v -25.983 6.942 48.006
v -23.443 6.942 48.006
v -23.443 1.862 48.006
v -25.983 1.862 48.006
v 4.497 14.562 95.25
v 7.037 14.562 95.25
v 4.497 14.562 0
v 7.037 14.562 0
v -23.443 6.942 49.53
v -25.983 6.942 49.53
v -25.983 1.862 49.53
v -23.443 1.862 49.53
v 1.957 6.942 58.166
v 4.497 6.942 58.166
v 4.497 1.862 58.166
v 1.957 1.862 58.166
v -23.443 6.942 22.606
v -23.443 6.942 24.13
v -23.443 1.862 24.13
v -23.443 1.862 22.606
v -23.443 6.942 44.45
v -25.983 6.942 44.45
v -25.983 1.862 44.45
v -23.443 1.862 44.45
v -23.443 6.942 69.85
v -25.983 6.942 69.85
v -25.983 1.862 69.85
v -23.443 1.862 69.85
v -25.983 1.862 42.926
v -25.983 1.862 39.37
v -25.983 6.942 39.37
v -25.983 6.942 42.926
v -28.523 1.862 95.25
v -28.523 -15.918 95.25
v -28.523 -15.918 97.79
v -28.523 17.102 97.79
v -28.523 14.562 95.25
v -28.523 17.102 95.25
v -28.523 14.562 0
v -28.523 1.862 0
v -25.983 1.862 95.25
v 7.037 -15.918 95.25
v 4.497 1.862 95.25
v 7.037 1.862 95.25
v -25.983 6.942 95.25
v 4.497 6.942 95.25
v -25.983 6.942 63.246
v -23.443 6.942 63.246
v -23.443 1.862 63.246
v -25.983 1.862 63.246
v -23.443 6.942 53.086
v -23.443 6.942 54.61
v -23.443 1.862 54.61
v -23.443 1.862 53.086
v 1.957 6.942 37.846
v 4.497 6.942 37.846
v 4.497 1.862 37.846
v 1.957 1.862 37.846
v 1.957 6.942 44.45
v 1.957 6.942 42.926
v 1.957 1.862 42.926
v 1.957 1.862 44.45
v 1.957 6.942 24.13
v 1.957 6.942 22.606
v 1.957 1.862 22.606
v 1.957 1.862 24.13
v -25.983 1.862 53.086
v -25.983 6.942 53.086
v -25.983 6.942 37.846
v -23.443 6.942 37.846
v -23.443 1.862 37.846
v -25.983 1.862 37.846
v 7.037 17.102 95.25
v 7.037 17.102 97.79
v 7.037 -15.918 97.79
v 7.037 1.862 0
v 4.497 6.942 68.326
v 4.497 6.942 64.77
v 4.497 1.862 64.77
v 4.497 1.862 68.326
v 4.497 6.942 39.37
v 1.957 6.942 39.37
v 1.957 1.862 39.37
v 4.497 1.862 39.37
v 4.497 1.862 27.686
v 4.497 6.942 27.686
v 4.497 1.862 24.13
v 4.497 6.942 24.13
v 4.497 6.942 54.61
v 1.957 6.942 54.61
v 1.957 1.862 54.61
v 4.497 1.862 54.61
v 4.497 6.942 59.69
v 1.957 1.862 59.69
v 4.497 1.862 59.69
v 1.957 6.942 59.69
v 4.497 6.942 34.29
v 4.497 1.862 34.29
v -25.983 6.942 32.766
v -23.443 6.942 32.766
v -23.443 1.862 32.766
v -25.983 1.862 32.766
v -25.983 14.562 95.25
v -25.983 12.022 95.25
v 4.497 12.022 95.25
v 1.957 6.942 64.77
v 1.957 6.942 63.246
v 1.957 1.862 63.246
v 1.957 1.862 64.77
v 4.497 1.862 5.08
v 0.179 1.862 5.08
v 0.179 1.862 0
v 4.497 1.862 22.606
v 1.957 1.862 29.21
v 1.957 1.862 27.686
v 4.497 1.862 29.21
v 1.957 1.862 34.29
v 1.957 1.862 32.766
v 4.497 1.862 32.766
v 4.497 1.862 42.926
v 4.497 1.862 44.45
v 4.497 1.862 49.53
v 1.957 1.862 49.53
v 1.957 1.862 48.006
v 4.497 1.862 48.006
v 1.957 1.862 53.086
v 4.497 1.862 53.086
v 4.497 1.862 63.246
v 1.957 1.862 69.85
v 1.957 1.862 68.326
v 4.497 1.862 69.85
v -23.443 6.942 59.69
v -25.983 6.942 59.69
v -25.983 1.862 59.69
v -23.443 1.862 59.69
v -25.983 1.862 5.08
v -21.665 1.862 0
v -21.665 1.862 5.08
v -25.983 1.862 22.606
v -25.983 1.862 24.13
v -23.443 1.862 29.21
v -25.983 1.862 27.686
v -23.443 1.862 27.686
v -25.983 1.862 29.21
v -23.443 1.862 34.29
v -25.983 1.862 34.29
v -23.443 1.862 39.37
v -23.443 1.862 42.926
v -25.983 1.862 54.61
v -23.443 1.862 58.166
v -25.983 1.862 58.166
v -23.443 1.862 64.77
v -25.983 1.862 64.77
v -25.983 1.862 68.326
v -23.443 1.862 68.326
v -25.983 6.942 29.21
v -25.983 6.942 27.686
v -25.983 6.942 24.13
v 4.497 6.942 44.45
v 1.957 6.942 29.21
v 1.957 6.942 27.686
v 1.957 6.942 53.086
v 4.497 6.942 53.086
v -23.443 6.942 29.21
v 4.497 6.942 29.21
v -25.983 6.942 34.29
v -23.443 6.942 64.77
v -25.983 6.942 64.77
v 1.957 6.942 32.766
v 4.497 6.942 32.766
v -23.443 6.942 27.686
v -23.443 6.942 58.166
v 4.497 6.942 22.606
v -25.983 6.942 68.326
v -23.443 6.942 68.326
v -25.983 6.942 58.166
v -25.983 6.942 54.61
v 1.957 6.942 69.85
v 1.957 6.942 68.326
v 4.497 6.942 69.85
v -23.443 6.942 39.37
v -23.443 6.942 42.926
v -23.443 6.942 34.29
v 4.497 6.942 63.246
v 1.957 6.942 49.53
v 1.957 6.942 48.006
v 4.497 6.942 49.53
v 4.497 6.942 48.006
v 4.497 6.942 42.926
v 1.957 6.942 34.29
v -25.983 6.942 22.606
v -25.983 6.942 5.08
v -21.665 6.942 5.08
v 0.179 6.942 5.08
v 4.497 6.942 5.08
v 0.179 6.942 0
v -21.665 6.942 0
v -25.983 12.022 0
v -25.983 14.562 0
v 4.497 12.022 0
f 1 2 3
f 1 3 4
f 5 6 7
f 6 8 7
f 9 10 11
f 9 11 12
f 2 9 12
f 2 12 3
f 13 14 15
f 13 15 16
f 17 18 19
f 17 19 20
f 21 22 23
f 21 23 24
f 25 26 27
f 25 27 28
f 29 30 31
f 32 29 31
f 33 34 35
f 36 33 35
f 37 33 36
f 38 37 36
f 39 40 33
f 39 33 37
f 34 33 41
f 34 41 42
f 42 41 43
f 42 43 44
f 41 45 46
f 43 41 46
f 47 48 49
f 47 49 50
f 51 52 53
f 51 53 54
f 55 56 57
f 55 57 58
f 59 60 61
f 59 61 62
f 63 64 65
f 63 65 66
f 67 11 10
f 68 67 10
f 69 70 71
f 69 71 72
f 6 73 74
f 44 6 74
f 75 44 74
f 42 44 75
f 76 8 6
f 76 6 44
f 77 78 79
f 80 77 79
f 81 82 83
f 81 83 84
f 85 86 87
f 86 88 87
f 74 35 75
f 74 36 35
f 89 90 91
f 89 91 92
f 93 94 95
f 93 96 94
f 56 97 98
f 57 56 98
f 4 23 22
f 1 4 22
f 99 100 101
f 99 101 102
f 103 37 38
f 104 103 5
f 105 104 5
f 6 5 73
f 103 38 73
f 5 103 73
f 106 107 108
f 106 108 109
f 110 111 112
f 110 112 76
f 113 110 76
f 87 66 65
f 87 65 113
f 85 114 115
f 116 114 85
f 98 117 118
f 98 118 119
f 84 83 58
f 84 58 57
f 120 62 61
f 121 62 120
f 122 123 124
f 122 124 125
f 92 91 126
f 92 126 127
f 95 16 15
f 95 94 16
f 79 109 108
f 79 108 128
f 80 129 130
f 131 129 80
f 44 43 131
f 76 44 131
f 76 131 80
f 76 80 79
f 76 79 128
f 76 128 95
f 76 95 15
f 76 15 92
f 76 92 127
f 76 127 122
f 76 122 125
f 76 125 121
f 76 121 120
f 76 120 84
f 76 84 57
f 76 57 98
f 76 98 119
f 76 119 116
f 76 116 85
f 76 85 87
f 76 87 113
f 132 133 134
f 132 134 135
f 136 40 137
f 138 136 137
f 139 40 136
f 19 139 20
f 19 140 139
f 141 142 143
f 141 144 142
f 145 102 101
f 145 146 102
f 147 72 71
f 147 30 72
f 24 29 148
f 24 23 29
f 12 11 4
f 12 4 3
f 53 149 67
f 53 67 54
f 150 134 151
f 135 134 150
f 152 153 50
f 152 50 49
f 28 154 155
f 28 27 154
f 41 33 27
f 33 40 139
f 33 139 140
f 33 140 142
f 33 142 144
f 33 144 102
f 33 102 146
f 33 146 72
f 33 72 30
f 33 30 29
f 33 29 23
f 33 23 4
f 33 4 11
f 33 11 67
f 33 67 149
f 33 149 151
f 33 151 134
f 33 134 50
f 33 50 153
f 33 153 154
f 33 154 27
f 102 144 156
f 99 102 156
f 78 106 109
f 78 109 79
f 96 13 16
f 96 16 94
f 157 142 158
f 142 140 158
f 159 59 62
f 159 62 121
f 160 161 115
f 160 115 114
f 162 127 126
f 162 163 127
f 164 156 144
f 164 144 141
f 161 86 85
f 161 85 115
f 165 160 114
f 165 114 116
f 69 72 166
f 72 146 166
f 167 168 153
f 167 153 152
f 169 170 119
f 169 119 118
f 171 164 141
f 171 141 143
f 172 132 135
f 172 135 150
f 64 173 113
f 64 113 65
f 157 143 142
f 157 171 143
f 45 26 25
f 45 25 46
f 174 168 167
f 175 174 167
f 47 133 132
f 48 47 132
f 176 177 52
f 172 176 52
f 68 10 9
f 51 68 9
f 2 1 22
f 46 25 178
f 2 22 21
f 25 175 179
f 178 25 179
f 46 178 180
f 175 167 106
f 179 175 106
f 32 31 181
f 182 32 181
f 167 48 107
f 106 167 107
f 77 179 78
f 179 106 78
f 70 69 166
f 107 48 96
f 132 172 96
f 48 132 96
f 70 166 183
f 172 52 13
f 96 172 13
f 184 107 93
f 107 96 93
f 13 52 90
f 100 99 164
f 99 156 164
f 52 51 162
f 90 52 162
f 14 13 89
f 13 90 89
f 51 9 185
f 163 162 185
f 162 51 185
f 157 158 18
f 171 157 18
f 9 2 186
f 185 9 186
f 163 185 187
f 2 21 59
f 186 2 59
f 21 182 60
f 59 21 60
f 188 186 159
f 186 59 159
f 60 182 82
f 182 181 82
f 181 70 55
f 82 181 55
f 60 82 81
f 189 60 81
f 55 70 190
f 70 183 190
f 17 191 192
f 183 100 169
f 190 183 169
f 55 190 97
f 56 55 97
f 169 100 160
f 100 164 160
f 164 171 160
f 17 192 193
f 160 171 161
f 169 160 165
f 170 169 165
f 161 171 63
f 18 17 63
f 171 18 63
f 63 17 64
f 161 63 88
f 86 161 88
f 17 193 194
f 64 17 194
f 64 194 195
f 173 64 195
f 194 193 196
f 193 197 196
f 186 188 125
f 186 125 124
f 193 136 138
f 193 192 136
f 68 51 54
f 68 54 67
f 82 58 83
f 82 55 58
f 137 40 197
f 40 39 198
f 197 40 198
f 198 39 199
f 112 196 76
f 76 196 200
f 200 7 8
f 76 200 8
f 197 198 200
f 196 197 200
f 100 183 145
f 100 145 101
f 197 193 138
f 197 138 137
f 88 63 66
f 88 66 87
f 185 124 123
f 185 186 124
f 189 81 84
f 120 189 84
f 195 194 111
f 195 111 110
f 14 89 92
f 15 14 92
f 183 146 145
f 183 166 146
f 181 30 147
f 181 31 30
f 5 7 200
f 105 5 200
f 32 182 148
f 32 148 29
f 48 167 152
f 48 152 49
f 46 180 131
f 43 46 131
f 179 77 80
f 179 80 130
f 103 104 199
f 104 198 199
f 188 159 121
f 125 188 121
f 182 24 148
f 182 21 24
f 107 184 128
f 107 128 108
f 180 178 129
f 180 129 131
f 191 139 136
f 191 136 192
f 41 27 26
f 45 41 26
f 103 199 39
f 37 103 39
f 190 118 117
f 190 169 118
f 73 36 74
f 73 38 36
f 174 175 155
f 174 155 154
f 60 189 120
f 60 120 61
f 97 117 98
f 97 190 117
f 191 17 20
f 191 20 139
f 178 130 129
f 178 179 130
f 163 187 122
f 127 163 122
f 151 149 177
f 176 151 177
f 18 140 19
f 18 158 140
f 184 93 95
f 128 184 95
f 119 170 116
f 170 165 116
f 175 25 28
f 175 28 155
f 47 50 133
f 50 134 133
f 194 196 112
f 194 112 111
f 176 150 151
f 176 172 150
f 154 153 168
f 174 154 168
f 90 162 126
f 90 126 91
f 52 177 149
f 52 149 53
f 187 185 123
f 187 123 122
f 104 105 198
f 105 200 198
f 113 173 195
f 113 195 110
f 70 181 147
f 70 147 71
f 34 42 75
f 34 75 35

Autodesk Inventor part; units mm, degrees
ref_plane "YZ Plane" through (0, 0, 0) normal (1, 0, 0) x (0, 1, 0)
ref_plane "XZ Plane" through (0, 0, 0) normal (0, 1, 0) x (-1, 0, 0)
sketch "Sketch1" plane through (0, 0, 0) normal (0, 0, 1) x (1, 0, 0)
  line L0 (-28.5226, 14.562) -> (-28.5226, 1.862)
  line L1 (-28.5226, 1.862) -> (-25.9826, 1.862)
  line L2 (-25.9826, 1.862) -> (-25.9826, 6.942)
  line L3 (-25.9826, 6.942) -> (4.4974, 6.942)
  line L4 (4.4974, 6.942) -> (4.4974, 1.862)
  line L5 (4.4974, 1.862) -> (7.0374, 1.862)
  line L6 (7.0374, 1.862) -> (7.0374, 14.562)
  line L7 (7.0374, 14.562) -> (4.4974, 14.562)
  line L8 (4.4974, 14.562) -> (4.4974, 12.022)
  line L9 (4.4974, 12.022) -> (-25.9826, 12.022)
  line L10 (-25.9826, 12.022) -> (-25.9826, 14.562)
  line L11 (-25.9826, 14.562) -> (-28.5226, 14.562)
  dimension "d0" = 35.56
  dimension "d1" = 2.54
  dimension "d2" = 12.7
  dimension "d3" = 5.08
  dimension "d4" = 2.54
  dimension "d5" = 2.54
extrude "Extrusion1" add sketch "Sketch1" along normal blind 95.25
sketch "Sketch2" plane through (-25.9826, 6.942, 0) normal (0, -1, 0) x (1, 0, 0)
  line L0 (30.48, 95.25) -> (0, 95.25) projected
  line L1 (0, 69.85) -> (2.54, 69.85)
  line L2 (2.54, 69.85) -> (2.54, 68.326)
  line L3 (2.54, 68.326) -> (0, 68.326)
  line L4 (0, 68.326) -> (0, 69.85)
  line L5 (0, 0) -> (0, 95.25) projected
  dimension "d8" = 1.524
  dimension "d9" = 2.54
  dimension "d10" = 25.4
extrude "Extrusion2" add sketch "Sketch2" along normal up to surface (5.08 mm away)
pattern_linear "Rectangular Pattern1" count 10 spacing 5.08 along (0, 0, -1) of "Extrusion2"
sketch "Sketch3" plane through (-25.9826, 6.942, 0) normal (0, -1, 0) x (1, 0, 0)
  line L0 (0, 49.53) -> (2.54, 49.53) projected
  line L1 (2.54, 49.53) -> (2.54, 48.006) projected
  line L2 (2.54, 48.006) -> (0, 48.006) projected
  line L3 (0, 44.45) -> (0, 48.006) projected
  line L4 (0, 44.45) -> (2.54, 44.45) projected
  line L5 (2.54, 44.45) -> (2.54, 42.926) projected
  line L6 (2.54, 42.926) -> (0, 42.926) projected
  line L7 (0, 0) -> (0, 42.926) projected
  line L8 (0, 0) -> (30.48, 0) projected
  line L9 (30.48, 0) -> (30.48, 95.25) projected
  line L10 (30.48, 95.25) -> (0, 95.25) projected
  line L11 (0, 69.85) -> (0, 95.25) projected
  line L12 (0, 69.85) -> (2.54, 69.85) projected
  line L13 (2.54, 69.85) -> (2.54, 68.326) projected
  line L14 (2.54, 68.326) -> (0, 68.326) projected
  line L15 (0, 64.77) -> (0, 68.326) projected
  line L16 (0, 64.77) -> (2.54, 64.77) projected
  line L17 (2.54, 64.77) -> (2.54, 63.246) projected
  line L18 (2.54, 63.246) -> (0, 63.246) projected
  line L19 (0, 59.69) -> (0, 63.246) projected
  line L20 (0, 59.69) -> (2.54, 59.69) projected
  line L21 (2.54, 59.69) -> (2.54, 58.166) projected
  line L22 (2.54, 58.166) -> (0, 58.166) projected
  line L23 (0, 54.61) -> (0, 58.166) projected
  line L24 (0, 54.61) -> (2.54, 54.61) projected
  line L25 (2.54, 54.61) -> (2.54, 53.086) projected
  line L26 (2.54, 53.086) -> (0, 53.086) projected
  line L27 (0, 49.53) -> (0, 53.086) projected
  line L28 (15.24, 80.1212) -> (15.24, 49.6412)
  circle A0 centre (15.24, 64.8812) radius 15.24 construction
  line L29 (30.48, 0) -> (30.48, 95.25) projected
  line L30 (0, 69.85) -> (0, 95.25) projected
ref_plane "Work Plane1" through (-10.7426, 6.942, 80.1212) normal (-1, 0, 0) x (0, -1, 0)
sketch "Sketch4" plane through (-25.9826, 6.942, 0) normal (0, -1, 0) x (1, 0, 0)
  line L0 (0, 0) -> (0, 22.606) projected
  line L1 (0, 0) -> (30.48, 0) projected
  line L2 (0, 0) -> (5.8186, 0)
  line L3 (0, 5.08) -> (4.318, 5.08)
  line L4 (4.318, 5.08) -> (4.318, 0)
  dimension "d17" = 5.08
  dimension "d18" = 4.318
extrude "Extrusion3" add sketch "Sketch4" along normal up to surface (5.08 mm away)
mirror "Mirror1" about plane through (-10.7426, 6.942, 80.1212) normal (-1, 0, 0) of "Extrusion2", "Rectangular Pattern1"
mirror "Mirror2" about plane through (-10.7426, 6.942, 80.1212) normal (-1, 0, 0) of "Extrusion3"
sketch "Sketch5" plane through (0, 0, 95.25) normal (0, 0, 1) x (1, 0, 0)
  line L0 (-28.5226, 14.562) -> (-25.9826, 14.562) projected
  line L1 (-28.5226, 1.862) -> (-28.5226, 14.562) projected
  line L2 (-25.9826, 1.862) -> (-28.5226, 1.862) projected
  line L3 (-25.9826, 6.942) -> (-25.9826, 1.862) projected
  line L4 (4.4974, 6.942) -> (-25.9826, 6.942) projected
  line L5 (4.4974, 1.862) -> (4.4974, 6.942) projected
  line L6 (7.0374, 1.862) -> (4.4974, 1.862) projected
  line L7 (7.0374, 14.562) -> (7.0374, 1.862) projected
  line L8 (4.4974, 14.562) -> (7.0374, 14.562) projected
  line L9 (4.4974, 12.022) -> (4.4974, 14.562) projected
  line L10 (-25.9826, 12.022) -> (4.4974, 12.022) projected
  line L11 (-25.9826, 14.562) -> (-25.9826, 12.022) projected
  line L12 (-28.5226, 17.102) -> (7.0374, 17.102)
  line L13 (7.0374, 17.102) -> (7.0374, -15.918)
  line L14 (7.0374, -15.918) -> (-28.5226, -15.918)
  line L15 (-28.5226, -15.918) -> (-28.5226, 17.102)
  dimension "d21" = 33.02
  dimension "d22" = 17.78
extrude "Extrusion4" add sketch "Sketch5" along normal blind 2.54
properties part number "slidelat"
